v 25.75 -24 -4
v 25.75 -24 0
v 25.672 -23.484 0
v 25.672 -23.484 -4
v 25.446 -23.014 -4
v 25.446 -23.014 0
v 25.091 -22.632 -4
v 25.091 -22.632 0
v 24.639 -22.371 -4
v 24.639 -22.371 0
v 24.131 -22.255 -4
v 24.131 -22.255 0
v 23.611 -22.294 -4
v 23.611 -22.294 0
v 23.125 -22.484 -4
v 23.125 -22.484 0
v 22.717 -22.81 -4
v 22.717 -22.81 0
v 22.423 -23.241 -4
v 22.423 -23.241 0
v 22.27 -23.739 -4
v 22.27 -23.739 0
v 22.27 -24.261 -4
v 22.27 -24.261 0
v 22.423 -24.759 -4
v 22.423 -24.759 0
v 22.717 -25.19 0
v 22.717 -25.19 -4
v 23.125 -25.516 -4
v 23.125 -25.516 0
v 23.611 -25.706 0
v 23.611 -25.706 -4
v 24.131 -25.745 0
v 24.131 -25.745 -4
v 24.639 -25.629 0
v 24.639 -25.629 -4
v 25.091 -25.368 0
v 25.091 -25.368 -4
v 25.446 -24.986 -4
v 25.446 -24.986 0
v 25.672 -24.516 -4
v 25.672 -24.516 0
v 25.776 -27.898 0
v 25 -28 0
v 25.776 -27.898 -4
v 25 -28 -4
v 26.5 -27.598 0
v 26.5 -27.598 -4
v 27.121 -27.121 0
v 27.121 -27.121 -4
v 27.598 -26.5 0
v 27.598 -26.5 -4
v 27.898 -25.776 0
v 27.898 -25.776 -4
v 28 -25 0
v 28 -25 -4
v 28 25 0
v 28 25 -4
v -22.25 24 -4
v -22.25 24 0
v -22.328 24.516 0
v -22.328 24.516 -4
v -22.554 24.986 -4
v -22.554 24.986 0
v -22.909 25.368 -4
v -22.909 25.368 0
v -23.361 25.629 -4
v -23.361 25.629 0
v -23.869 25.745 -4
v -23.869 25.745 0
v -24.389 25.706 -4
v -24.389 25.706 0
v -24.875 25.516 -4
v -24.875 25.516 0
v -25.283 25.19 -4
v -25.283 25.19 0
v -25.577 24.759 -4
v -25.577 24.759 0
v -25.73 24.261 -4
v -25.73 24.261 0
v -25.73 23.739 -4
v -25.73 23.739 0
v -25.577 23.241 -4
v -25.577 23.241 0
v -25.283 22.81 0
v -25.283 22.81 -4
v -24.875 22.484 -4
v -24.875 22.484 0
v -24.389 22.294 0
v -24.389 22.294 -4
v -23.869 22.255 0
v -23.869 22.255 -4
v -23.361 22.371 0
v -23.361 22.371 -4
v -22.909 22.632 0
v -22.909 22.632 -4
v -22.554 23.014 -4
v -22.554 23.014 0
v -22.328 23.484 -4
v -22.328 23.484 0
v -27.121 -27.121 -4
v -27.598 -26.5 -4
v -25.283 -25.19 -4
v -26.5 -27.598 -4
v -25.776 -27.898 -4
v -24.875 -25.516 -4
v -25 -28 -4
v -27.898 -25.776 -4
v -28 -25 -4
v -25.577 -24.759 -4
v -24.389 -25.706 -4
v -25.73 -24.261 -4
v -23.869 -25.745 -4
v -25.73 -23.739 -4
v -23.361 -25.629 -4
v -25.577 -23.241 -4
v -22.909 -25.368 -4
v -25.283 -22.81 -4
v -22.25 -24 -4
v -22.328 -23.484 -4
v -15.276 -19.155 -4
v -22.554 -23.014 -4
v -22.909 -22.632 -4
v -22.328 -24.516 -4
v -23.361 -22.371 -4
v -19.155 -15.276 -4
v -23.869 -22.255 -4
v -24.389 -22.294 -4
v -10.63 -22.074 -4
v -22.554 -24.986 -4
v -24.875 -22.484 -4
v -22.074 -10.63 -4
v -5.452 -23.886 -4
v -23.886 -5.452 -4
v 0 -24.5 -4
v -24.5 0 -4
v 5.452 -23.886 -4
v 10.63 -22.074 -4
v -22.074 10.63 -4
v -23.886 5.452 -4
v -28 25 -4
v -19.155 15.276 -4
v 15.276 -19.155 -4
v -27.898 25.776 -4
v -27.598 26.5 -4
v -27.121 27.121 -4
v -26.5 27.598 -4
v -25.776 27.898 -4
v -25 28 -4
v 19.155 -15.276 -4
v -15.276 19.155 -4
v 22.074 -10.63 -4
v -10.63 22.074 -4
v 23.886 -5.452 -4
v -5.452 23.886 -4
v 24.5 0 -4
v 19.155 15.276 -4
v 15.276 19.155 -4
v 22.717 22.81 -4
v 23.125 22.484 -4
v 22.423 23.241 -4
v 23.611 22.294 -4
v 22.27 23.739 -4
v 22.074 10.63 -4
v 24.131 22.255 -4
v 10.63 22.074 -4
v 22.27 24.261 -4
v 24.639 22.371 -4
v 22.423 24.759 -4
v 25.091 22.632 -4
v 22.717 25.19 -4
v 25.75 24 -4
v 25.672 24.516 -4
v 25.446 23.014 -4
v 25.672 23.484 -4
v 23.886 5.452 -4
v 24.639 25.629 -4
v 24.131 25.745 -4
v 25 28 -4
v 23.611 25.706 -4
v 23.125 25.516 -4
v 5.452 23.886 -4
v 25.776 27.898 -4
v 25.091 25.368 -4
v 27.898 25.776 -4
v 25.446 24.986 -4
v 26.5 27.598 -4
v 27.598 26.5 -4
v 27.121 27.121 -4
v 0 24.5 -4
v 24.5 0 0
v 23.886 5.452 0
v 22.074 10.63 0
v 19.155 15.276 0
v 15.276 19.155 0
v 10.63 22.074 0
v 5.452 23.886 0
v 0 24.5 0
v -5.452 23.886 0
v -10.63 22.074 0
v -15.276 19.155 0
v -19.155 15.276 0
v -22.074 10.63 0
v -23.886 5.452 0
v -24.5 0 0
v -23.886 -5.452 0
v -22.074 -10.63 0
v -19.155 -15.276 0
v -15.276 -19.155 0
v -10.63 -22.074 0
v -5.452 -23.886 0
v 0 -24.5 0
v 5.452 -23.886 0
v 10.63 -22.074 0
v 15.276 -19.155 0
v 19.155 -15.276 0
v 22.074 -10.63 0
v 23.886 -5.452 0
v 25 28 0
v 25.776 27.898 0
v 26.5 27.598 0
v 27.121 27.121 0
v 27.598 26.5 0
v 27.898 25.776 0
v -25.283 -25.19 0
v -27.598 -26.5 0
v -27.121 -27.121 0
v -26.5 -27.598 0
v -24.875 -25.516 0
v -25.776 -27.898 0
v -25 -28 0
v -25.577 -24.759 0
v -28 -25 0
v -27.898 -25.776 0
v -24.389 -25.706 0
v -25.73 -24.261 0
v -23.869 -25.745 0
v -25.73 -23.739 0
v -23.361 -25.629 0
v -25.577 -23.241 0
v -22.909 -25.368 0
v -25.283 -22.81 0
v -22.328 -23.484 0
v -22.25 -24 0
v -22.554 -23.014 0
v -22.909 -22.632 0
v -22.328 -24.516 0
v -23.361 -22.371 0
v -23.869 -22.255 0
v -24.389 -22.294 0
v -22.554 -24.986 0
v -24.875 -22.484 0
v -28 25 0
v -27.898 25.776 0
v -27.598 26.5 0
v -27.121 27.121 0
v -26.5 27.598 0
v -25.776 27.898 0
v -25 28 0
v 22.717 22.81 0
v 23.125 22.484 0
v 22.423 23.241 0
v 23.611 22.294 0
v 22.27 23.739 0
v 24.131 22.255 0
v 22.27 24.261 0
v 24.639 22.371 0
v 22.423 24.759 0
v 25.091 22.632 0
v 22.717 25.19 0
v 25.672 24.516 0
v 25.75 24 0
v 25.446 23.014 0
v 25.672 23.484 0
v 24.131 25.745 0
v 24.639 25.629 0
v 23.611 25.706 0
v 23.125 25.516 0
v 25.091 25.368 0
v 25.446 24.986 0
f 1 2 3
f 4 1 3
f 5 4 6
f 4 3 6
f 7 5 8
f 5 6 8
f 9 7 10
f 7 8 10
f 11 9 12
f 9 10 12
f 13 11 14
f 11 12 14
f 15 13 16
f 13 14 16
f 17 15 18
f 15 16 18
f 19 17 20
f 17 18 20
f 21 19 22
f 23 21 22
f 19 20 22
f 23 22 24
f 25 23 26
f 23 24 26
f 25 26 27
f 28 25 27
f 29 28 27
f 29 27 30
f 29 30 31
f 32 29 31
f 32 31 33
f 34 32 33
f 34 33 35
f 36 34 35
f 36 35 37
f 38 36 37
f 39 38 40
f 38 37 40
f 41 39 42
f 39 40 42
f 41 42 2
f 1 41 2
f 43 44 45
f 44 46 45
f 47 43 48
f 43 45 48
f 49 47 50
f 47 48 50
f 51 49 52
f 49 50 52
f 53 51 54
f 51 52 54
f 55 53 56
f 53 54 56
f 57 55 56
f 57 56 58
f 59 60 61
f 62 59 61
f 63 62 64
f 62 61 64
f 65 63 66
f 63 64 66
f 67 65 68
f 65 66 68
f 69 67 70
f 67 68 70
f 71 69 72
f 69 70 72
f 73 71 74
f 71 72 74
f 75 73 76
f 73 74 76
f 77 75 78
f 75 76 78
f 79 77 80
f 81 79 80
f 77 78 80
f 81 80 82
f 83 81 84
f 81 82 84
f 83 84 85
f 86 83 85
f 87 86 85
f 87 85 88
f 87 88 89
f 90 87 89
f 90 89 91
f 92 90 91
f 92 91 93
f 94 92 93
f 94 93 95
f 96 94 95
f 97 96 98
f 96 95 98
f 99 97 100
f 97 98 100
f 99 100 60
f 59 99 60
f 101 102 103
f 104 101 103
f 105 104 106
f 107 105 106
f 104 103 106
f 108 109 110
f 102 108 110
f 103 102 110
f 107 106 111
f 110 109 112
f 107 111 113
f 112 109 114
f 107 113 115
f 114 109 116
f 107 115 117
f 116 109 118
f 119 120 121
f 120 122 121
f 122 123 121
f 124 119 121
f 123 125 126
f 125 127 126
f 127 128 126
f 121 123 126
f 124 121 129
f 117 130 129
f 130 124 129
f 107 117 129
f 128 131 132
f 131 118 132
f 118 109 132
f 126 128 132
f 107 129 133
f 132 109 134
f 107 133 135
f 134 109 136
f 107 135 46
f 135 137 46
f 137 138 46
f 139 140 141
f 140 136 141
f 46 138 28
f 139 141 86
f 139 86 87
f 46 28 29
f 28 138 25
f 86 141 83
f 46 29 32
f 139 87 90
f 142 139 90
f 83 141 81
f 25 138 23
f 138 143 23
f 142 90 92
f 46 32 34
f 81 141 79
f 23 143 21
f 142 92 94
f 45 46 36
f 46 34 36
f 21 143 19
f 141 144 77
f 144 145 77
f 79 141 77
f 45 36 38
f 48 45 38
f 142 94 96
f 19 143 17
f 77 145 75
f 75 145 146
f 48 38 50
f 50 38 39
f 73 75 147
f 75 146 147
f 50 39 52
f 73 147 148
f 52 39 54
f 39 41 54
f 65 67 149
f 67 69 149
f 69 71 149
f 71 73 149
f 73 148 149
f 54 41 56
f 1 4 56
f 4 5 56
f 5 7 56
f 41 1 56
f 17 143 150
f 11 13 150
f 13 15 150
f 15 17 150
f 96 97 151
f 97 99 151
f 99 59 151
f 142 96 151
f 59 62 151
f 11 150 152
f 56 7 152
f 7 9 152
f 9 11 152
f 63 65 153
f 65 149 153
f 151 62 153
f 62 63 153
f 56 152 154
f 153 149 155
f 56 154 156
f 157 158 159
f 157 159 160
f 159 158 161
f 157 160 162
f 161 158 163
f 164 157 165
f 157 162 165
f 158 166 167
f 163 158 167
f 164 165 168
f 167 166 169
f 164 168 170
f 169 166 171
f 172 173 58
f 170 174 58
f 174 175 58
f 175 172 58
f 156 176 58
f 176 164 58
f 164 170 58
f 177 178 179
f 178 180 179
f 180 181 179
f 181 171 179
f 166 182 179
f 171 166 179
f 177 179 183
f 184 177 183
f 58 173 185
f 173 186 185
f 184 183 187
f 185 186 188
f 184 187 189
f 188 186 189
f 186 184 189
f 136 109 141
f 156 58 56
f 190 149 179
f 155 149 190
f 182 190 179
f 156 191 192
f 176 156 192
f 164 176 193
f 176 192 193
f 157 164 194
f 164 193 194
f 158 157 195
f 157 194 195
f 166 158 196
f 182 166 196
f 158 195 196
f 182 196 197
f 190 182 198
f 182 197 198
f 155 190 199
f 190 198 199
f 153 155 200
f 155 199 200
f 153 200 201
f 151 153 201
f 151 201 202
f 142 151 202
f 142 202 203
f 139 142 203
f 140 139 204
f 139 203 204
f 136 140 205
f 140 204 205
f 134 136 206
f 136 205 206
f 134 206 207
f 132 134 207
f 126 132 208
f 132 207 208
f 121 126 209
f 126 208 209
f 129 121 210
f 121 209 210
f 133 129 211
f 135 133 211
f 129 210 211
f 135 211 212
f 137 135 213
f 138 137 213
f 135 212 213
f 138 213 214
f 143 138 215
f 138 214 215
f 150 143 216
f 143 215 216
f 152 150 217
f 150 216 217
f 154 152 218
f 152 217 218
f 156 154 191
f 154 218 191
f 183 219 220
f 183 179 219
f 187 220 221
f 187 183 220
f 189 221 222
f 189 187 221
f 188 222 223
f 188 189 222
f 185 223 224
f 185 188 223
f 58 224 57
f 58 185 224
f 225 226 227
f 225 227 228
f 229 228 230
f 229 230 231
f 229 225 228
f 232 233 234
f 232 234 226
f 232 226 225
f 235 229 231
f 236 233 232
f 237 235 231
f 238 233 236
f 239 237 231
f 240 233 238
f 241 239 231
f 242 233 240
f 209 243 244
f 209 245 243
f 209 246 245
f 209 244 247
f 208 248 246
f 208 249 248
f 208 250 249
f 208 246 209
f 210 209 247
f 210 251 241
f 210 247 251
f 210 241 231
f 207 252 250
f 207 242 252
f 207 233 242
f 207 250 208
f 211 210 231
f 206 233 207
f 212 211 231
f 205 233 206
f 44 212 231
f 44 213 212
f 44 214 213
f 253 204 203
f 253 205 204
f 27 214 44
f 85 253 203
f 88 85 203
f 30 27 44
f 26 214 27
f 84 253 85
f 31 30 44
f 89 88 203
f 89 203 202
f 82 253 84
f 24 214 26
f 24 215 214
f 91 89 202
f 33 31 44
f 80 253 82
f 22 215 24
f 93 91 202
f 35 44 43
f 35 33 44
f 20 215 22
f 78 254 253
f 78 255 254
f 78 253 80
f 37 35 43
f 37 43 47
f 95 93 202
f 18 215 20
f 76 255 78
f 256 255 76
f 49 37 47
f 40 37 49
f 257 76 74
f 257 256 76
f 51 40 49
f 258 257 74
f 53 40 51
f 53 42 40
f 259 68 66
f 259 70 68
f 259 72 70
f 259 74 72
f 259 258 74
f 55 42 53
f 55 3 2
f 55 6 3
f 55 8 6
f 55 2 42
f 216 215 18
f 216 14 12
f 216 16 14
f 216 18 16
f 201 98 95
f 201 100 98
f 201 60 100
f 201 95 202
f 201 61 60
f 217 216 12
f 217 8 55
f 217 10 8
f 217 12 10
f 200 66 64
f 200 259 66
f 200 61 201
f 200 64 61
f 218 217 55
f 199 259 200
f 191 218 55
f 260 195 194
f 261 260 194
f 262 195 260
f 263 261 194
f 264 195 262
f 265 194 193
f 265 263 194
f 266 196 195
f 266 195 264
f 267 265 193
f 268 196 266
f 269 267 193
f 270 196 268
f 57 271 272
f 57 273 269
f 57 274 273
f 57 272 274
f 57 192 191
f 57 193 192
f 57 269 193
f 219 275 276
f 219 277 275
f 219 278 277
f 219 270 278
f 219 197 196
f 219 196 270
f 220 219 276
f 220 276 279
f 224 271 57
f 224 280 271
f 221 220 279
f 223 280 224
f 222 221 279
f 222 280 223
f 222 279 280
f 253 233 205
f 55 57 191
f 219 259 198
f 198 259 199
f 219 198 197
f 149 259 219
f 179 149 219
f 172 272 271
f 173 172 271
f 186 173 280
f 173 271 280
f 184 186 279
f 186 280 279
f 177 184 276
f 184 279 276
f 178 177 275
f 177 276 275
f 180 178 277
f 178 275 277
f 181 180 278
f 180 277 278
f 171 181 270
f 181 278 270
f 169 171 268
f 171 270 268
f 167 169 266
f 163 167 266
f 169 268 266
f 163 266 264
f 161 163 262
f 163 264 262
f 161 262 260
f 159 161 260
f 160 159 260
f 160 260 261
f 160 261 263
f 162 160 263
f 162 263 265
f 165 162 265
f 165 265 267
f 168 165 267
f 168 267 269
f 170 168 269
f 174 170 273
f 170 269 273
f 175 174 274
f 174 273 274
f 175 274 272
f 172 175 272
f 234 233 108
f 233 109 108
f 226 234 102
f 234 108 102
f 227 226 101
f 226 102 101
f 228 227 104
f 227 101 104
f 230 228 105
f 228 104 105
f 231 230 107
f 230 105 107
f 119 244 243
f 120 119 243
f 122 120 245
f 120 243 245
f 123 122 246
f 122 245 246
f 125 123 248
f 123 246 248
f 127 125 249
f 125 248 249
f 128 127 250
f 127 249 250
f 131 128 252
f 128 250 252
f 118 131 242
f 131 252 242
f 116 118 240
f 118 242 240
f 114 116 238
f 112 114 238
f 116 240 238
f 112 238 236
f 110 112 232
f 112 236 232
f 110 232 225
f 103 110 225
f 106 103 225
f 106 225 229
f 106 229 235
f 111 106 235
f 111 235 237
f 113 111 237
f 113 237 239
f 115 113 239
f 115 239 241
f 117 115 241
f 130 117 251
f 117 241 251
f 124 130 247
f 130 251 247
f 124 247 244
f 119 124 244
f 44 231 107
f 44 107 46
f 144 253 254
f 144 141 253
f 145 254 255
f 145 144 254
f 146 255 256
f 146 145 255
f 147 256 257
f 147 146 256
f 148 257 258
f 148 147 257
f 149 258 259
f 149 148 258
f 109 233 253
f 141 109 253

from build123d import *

# Parameters (mm, degrees)
SKETCH_1_W             = 56
SKETCH_1_H             = 56
SM_BASE_FLANGE_1_DEPTH = 4
SKETCH_6_R             = 24.5
SKETCH_6_R_2           = 1.75
CUT_EXTRUDE_1_DEPTH    = 4
FILLET_1_R             = 3


# Sheet-metal steps are written as plain solids
with BuildPart() as part:
    # Sketch 1 → Базовая кромка1 (new body)
    with BuildSketch(Plane.XY):
        Rectangle(SKETCH_1_W, SKETCH_1_H)
    extrude(amount=-SM_BASE_FLANGE_1_DEPTH)

    # Эскиз6 → Вырез-Вытянуть1 (cut)
    with BuildSketch(Plane.XY):
        Circle(SKETCH_6_R)
        with Locations((-24, 24)):
            Circle(SKETCH_6_R_2)
        with Locations((24, 24)):
            Circle(SKETCH_6_R_2)
        with Locations((24, -24)):
            Circle(SKETCH_6_R_2)
        with Locations((-24, -24)):
            Circle(SKETCH_6_R_2)
    extrude(amount=-CUT_EXTRUDE_1_DEPTH, mode=Mode.SUBTRACT)

    # Скругление1
    fillet_1_edges = [part.edges().sort_by_distance(p)[0] for p in [
        (28, -28, -2),
        (-28, -28, -2),
        (-28, 28, -2),
        (28, 28, -2),
    ]]
    fillet(fillet_1_edges, radius=FILLET_1_R)


solid = part.part
